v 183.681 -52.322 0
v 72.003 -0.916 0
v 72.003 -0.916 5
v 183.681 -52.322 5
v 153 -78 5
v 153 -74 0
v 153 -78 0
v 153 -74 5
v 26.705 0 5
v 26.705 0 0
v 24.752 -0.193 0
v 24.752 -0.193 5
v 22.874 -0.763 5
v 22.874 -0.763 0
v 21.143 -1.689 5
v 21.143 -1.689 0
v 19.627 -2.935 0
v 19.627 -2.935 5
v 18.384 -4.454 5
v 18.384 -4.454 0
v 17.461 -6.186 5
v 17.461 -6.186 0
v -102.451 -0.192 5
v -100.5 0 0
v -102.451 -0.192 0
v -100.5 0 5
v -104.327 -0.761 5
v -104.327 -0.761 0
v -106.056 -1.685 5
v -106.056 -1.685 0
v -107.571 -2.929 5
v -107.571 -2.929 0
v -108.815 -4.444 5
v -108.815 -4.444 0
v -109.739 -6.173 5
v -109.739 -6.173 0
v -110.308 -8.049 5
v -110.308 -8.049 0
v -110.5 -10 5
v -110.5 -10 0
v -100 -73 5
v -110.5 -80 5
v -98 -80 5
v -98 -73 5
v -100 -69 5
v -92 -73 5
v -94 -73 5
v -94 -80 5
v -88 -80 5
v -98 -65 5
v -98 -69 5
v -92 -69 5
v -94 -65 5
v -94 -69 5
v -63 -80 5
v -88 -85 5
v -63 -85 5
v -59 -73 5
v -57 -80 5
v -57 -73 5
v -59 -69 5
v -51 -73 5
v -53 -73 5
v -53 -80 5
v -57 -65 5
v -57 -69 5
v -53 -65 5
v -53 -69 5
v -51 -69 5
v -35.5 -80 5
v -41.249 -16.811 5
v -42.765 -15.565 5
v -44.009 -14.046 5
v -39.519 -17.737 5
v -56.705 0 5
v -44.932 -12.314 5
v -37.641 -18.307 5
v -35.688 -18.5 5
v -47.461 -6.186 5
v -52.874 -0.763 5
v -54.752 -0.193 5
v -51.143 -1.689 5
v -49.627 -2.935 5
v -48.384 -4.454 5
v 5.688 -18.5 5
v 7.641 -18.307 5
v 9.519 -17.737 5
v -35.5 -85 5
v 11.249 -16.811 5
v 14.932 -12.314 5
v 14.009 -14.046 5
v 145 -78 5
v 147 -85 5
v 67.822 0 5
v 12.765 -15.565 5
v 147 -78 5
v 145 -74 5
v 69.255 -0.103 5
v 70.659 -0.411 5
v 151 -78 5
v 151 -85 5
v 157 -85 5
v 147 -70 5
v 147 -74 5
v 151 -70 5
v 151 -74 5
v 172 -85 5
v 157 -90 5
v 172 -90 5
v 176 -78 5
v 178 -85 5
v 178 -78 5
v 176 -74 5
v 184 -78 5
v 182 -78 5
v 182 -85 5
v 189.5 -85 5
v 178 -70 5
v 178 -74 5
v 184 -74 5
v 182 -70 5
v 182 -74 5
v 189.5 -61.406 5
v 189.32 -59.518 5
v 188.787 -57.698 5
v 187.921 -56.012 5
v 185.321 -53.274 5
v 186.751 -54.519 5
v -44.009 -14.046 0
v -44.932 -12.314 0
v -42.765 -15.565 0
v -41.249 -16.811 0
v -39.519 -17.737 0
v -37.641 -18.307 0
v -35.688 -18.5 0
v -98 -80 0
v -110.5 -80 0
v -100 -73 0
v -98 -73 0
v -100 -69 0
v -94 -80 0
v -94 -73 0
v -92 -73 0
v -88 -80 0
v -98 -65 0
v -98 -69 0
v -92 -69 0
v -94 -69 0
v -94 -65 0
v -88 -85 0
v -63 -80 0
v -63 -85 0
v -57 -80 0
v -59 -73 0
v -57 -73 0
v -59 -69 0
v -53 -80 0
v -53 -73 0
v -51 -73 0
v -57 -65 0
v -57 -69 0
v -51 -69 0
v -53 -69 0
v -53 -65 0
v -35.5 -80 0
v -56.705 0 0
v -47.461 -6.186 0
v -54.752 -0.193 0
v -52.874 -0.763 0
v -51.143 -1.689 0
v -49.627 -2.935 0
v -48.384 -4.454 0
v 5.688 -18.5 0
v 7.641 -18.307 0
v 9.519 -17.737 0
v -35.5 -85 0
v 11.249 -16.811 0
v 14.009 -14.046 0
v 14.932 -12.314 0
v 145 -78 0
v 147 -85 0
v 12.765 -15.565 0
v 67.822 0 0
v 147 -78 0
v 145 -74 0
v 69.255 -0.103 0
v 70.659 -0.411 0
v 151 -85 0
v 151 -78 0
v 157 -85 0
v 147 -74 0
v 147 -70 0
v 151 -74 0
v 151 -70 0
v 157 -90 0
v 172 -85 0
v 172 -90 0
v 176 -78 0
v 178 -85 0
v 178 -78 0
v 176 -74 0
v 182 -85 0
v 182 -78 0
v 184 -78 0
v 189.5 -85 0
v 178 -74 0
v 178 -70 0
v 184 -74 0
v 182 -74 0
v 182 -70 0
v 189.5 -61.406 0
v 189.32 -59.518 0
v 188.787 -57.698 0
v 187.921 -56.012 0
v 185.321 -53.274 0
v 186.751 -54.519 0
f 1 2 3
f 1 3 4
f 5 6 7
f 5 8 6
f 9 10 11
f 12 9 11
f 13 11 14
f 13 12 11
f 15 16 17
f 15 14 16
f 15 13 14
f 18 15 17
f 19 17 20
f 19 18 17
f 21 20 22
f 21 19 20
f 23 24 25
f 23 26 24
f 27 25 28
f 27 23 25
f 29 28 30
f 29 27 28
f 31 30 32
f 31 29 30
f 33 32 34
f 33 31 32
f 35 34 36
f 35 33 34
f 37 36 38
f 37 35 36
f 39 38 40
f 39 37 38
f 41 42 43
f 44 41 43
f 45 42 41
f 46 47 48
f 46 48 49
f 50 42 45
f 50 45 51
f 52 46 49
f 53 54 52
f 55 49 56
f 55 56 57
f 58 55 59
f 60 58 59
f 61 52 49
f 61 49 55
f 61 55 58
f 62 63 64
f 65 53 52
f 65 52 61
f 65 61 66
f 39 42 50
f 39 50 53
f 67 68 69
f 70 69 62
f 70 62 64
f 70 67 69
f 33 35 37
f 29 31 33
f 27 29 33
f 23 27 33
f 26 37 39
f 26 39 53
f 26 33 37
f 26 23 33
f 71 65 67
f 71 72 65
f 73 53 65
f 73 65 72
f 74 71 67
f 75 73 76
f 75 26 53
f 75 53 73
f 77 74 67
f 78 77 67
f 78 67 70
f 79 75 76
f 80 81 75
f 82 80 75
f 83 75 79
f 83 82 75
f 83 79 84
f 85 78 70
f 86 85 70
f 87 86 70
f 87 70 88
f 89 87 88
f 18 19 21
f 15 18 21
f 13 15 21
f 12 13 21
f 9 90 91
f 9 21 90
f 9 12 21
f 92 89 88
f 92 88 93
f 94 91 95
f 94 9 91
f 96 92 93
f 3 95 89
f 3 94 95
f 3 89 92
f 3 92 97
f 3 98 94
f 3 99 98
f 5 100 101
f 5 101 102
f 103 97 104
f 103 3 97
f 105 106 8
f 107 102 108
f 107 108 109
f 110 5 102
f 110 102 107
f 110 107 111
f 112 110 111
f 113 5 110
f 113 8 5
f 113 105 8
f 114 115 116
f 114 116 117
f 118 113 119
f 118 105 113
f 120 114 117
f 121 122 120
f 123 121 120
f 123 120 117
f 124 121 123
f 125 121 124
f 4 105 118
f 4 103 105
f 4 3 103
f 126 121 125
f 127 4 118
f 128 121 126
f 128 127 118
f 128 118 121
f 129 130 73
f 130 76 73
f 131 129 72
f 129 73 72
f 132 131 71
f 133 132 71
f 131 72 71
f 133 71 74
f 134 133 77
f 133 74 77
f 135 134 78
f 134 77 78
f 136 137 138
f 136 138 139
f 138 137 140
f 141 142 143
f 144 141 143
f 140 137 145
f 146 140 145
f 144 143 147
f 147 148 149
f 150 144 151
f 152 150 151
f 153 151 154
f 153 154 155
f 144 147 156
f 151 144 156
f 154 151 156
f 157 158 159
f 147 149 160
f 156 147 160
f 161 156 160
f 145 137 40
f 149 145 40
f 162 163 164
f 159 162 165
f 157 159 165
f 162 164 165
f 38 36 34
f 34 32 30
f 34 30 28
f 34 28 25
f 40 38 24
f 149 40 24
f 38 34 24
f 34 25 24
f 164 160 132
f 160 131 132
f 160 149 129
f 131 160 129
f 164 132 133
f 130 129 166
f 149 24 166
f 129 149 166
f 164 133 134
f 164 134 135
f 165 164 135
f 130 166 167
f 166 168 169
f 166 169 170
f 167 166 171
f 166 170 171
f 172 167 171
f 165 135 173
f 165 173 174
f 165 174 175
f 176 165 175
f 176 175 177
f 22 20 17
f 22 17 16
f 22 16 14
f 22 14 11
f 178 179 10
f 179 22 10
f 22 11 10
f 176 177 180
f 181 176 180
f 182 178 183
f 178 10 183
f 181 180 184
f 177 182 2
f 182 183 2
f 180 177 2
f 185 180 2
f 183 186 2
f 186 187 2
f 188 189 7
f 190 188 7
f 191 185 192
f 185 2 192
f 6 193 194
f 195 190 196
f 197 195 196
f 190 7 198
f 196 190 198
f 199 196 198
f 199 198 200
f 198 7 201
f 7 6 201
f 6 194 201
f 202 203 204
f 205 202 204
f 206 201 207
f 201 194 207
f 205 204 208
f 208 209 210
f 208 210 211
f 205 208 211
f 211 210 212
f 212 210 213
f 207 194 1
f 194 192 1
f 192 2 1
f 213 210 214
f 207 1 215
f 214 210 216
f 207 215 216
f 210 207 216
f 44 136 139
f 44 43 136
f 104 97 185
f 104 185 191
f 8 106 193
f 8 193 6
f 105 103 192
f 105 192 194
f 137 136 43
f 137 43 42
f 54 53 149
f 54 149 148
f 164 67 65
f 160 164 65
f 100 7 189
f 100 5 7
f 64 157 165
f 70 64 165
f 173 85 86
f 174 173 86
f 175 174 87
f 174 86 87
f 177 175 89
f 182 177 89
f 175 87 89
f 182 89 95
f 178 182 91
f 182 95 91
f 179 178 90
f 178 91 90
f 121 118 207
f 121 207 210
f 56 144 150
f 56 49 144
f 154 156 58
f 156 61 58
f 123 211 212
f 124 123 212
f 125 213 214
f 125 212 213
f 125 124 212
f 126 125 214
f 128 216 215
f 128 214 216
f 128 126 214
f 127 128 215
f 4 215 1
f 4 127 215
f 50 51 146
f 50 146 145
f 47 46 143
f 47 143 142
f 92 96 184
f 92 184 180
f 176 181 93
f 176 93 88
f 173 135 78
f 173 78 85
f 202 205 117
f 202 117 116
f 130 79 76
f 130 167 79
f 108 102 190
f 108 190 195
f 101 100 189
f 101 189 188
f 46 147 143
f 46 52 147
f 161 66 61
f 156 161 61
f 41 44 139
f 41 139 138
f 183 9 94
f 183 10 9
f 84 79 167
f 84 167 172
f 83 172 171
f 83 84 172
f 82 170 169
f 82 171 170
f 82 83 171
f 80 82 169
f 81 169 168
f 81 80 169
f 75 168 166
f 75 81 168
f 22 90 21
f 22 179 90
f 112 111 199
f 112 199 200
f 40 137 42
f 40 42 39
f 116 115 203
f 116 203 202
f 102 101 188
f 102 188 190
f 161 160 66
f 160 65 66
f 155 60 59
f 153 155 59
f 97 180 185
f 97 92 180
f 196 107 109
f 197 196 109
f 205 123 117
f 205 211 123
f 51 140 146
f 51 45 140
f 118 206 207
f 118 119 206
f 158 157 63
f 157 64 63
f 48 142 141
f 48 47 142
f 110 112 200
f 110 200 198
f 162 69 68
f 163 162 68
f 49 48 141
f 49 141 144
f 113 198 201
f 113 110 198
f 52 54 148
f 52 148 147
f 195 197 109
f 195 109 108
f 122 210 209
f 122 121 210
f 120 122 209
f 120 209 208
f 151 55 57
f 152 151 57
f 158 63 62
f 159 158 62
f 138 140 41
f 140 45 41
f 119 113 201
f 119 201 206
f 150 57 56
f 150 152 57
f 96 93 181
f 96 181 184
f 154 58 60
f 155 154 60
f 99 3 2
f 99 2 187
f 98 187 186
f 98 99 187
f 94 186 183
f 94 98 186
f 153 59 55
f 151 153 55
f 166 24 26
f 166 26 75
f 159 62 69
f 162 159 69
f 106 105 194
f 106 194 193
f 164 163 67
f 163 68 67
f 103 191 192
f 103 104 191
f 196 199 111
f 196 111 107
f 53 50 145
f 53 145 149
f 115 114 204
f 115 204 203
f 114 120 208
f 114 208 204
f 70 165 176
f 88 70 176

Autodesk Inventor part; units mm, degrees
ref_plane "YZ Plane" through (0, 0, 0) normal (1, 0, 0) x (0, 1, 0)
ref_plane "XZ Plane" through (0, 0, 0) normal (0, 1, 0) x (-1, 0, 0)
ref_plane "XY Plane" through (0, 0, 0) normal (0, 0, 1) x (1, 0, 0)
sketch "Sketch1" plane through (0, 0, 0) normal (0, 0, 1) x (1, 0, 0)
  circle A0 centre (0, 0) radius 63.5 construction
  line L0 (0, 0) -> (-110.5, 0) construction
  line L1 (-110.5, 0) -> (-110.5, -80) construction
  line L2 (-110.5, -80) -> (-35.5, -80) construction
  line L3 (0, 0) -> (189.5, 0) construction
  line L4 (189.5, 0) -> (189.5, -85) construction
  line L5 (189.5, -85) -> (134.5, -85) construction
  line L6 (-93, -80) -> (-53, -80) construction
  line L7 (-53, -80) -> (-53, -85) construction
  line L8 (-53, -85) -> (-93, -85) construction
  line L9 (-93, -85) -> (-93, -80) construction
  line L10 (147, -85) -> (177, -85) construction
  line L11 (177, -85) -> (177, -90) construction
  line L12 (177, -90) -> (147, -90) construction
  line L13 (147, -90) -> (147, -85) construction
  circle A1 centre (0, 0) radius 18.5 construction
  line L14 (-35.5, -80) -> (134.5, -85) construction
  line L15 (0, 0) -> (0, -63.5) construction
  line L16 (-20.0131, 0) -> (0, -48.5) construction
  line L17 (20.0131, 0) -> (0, -48.5) construction
  line L18 (-53, -80) -> (-53, -85)
  line L19 (-53, -85) -> (-93, -85)
  line L20 (-93, -85) -> (-93, -80)
  line L21 (-93, -80) -> (-110.5, -80)
  line L22 (-110.5, -80) -> (-110.5, 0)
  line L23 (-110.5, 0) -> (-20.0131, 0) construction
  line L24 (-20.0131, 0) -> (0, -48.5) construction
  line L25 (0, -48.5) -> (20.0131, 0) construction
  line L26 (20.0131, 0) -> (189.5, 0) construction
  line L27 (189.5, 0) -> (189.5, -85) construction
  line L28 (189.5, -85) -> (177, -85)
  line L29 (177, -85) -> (177, -90)
  line L30 (177, -90) -> (147, -90)
  line L31 (147, -90) -> (147, -85)
  line L32 (147, -85) -> (79.5, -85)
  line L33 (-53, -80) -> (-35.5, -80)
  line L34 (-35.5, -80) -> (-35.5, -85)
  line L35 (-35.5, -85) -> (79.5, -85)
  line L36 (20.0131, 0) -> (70.0131, 0)
  line L37 (70.0131, 0) -> (189.5, -55)
  line L38 (189.5, -55) -> (189.5, -85)
  line L39 (0, -48.5) -> (-30, -48.5) construction
  line L40 (-30, -48.5) -> (-50.0131, 0) construction
  line L41 (12.3793, -18.5) -> (-42.3793, -18.5) construction
  line L42 (-110.5, 0) -> (-50.0131, 0)
  line L43 (-50.0131, 0) -> (-42.3793, -18.5)
  line L44 (-42.3793, -18.5) -> (12.3793, -18.5)
  line L45 (12.3793, -18.5) -> (20.0131, 0)
  dimension "d0" = 127
  dimension "d1" = 110.5
  dimension "d2" = 80
  dimension "d3" = 75
  dimension "d4" = 189.5
  dimension "d5" = 85
  dimension "d6" = 55
  dimension "d7" = 40
  dimension "d8" = 5
  dimension "d9" = 17.5
  dimension "d10" = 30
  dimension "d11" = 5
  dimension "d12" = 42.5
  dimension "d13" = 37
  dimension "d14" = 15
  dimension "d18" = 50
  dimension "d19" = 30
  dimension "d59" = 30
extrude "Extrusion1" add sketch "Sketch1" along normal blind 5
fillet "Fillet1" radius 10 4 edges at (-110.5, 0, 2.5) (20.0131, 0, 2.5) (70.0131, 0, 2.5) (189.5, -55, 2.5)
sketch "Sketch2" plane through (0, 0, 5) normal (0, 0, 1) x (1, 0, 0)
  circle A0 centre (0, 0) radius 63.5 construction
  line L0 (0, 0) -> (-110.5, 0) construction
  line L1 (-110.5, 0) -> (-110.5, -80) construction
  line L2 (0, 0) -> (189.5, 0) construction
  line L3 (189.5, 0) -> (189.5, -85) construction
  line L4 (-88, -80) -> (-63, -80) construction
  line L5 (-63, -80) -> (-63, -85) construction
  line L6 (-63, -85) -> (-88, -85) construction
  line L7 (-88, -85) -> (-88, -80) construction
  line L8 (157, -85) -> (172, -85) construction
  line L9 (172, -85) -> (172, -90) construction
  line L10 (172, -90) -> (157, -90) construction
  line L11 (157, -90) -> (157, -85) construction
  circle A1 centre (0, 0) radius 33.5 construction
  line L12 (-35.5, -80) -> (134.5, -85) construction
  line L13 (0, 0) -> (0, -63.5) construction
  line L14 (-40.8636, 0) -> (0, -58.5) construction
  line L15 (40.8636, 0) -> (0, -58.5) construction
  line L16 (-63, -80) -> (-63, -85) construction
  line L17 (-63, -85) -> (-88, -85) construction
  line L18 (-88, -85) -> (-88, -80) construction
  line L19 (-110.5, -80) -> (-110.5, 0) construction
  line L20 (-110.5, 0) -> (-40.8636, 0) construction
  line L21 (-40.8636, 0) -> (0, -58.5) construction
  line L22 (0, -58.5) -> (40.8636, 0) construction
  line L23 (40.8636, 0) -> (189.5, 0) construction
  line L24 (189.5, 0) -> (189.5, -85) construction
  line L25 (172, -85) -> (172, -90) construction
  line L26 (172, -90) -> (157, -90) construction
  line L27 (157, -90) -> (157, -85) construction
  line L28 (-35.5, -80) -> (-35.5, -85) construction
  line L29 (-35.5, -85) -> (94.5, -85) construction
  line L30 (40.8636, 0) -> (70.8636, 0) construction
  line L31 (70.8636, 0) -> (189.5, -55) construction
  line L32 (189.5, -55) -> (189.5, -85) construction
  line L33 (151, -85) -> (145, -85) construction
  line L34 (172, -85) -> (178, -85) construction
  line L35 (151, -85) -> (149, -85) construction
  line L36 (147, -85) -> (147, -70) construction
  line L37 (147, -70) -> (151, -70) construction
  line L38 (151, -70) -> (151, -85) construction
  line L39 (149, -70) -> (149, -85) construction
  line L40 (145, -78) -> (153, -78) construction
  line L41 (153, -78) -> (153, -74) construction
  line L42 (153, -74) -> (145, -74) construction
  line L43 (145, -74) -> (145, -78) construction
  line L44 (145, -78) -> (153, -74) construction
  line L45 (153, -78) -> (145, -74) construction
  line L46 (180, -85) -> (182, -85) construction
  line L47 (182, -85) -> (182, -70) construction
  line L48 (182, -70) -> (178, -70) construction
  line L49 (178, -70) -> (178, -85) construction
  line L50 (180, -70) -> (180, -85) construction
  line L51 (184, -78) -> (176, -78) construction
  line L52 (176, -78) -> (176, -74) construction
  line L53 (176, -74) -> (184, -74) construction
  line L54 (184, -74) -> (184, -78) construction
  line L55 (184, -78) -> (176, -74) construction
  line L56 (176, -78) -> (184, -74) construction
  line L57 (147, -85) -> (147, -78) construction
  line L58 (147, -85) -> (147, -78) construction
  line L59 (147, -78) -> (145, -78) construction
  line L60 (145, -78) -> (145, -74) construction
  line L61 (145, -74) -> (147, -74) construction
  line L62 (147, -74) -> (147, -70) construction
  line L63 (147, -70) -> (151, -70) construction
  line L64 (151, -70) -> (151, -74) construction
  line L65 (151, -74) -> (153, -74) construction
  line L66 (153, -74) -> (153, -78) construction
  line L67 (153, -78) -> (151, -78) construction
  line L68 (151, -78) -> (151, -85) construction
  line L69 (147, -85) -> (134.5, -85) construction
  line L70 (157, -85) -> (151, -85) construction
  line L71 (147, -85) -> (94.5, -85) construction
  line L72 (178, -85) -> (178, -78) construction
  line L73 (178, -78) -> (176, -78) construction
  line L74 (176, -78) -> (176, -74) construction
  line L75 (176, -74) -> (178, -74) construction
  line L76 (178, -74) -> (178, -70) construction
  line L77 (178, -70) -> (182, -70) construction
  line L78 (182, -70) -> (182, -74) construction
  line L79 (182, -74) -> (184, -74) construction
  line L80 (184, -74) -> (184, -78) construction
  line L81 (184, -78) -> (182, -78) construction
  line L82 (182, -78) -> (182, -85) construction
  line L83 (189.5, -85) -> (180, -85) construction
  line L84 (178, -85) -> (149, -85) construction
  line L85 (189.5, -85) -> (182, -85) construction
  line L86 (178, -85) -> (172, -85) construction
  line L87 (-98, -80) -> (-98, -65) construction
  line L88 (-98, -65) -> (-94, -65) construction
  line L89 (-94, -65) -> (-94, -80) construction
  line L90 (-55, -80) -> (-53, -80) construction
  line L91 (-53, -80) -> (-53, -65) construction
  line L92 (-53, -65) -> (-57, -65) construction
  line L93 (-57, -65) -> (-57, -80) construction
  line L94 (-96, -65) -> (-96, -80) construction
  line L95 (-55, -65) -> (-55, -80) construction
  line L96 (-100, -73) -> (-92, -73) construction
  line L97 (-92, -73) -> (-92, -69) construction
  line L98 (-92, -69) -> (-100, -69) construction
  line L99 (-100, -69) -> (-100, -73) construction
  line L100 (-100, -73) -> (-92, -69) construction
  line L101 (-92, -73) -> (-100, -69) construction
  line L102 (-51, -73) -> (-59, -73) construction
  line L103 (-59, -73) -> (-59, -69) construction
  line L104 (-59, -69) -> (-51, -69) construction
  line L105 (-51, -69) -> (-51, -73) construction
  line L106 (-51, -73) -> (-59, -69) construction
  line L107 (-59, -73) -> (-51, -69) construction
  line L108 (-98, -80) -> (-98, -73) construction
  line L109 (-98, -73) -> (-100, -73) construction
  line L110 (-100, -73) -> (-100, -69) construction
  line L111 (-100, -69) -> (-98, -69) construction
  line L112 (-98, -69) -> (-98, -65) construction
  line L113 (-98, -65) -> (-94, -65) construction
  line L114 (-94, -65) -> (-94, -69) construction
  line L115 (-94, -69) -> (-92, -69) construction
  line L116 (-92, -69) -> (-92, -73) construction
  line L117 (-92, -73) -> (-94, -73) construction
  line L118 (-94, -73) -> (-94, -80) construction
  line L119 (-88, -80) -> (-94, -80) construction
  line L120 (-98, -80) -> (-110.5, -80) construction
  line L121 (-57, -80) -> (-57, -73) construction
  line L122 (-57, -73) -> (-59, -73) construction
  line L123 (-59, -73) -> (-59, -69) construction
  line L124 (-59, -69) -> (-57, -69) construction
  line L125 (-57, -69) -> (-57, -65) construction
  line L126 (-57, -65) -> (-53, -65) construction
  line L127 (-53, -65) -> (-53, -69) construction
  line L128 (-53, -69) -> (-51, -69) construction
  line L129 (-51, -69) -> (-51, -73) construction
  line L130 (-51, -73) -> (-53, -73) construction
  line L131 (-53, -73) -> (-53, -80) construction
  line L132 (-110.5, -80) -> (-57, -80) construction
  line L133 (-55, -80) -> (-35.5, -80) construction
  line L134 (-63, -80) -> (-57, -80) construction
  line L135 (-53, -80) -> (-35.5, -80) construction
  line L136 (-88, -85) -> (-94, -85)
  line L137 (-94, -85) -> (-94, -80)
  line L138 (-94, -80) -> (-88, -80)
  line L139 (-88, -80) -> (-88, -85)
  line L140 (-94, -80) -> (-98, -80)
  line L141 (-98, -80) -> (-98, -73)
  line L142 (-98, -73) -> (-100, -73)
  line L143 (-100, -69) -> (-100, -73)
  line L144 (-100, -69) -> (-98, -69)
  line L145 (-98, -69) -> (-98, -65)
  line L146 (-98, -65) -> (-94, -65)
  line L147 (-94, -65) -> (-94, -69)
  line L148 (-94, -69) -> (-92, -69)
  line L149 (-92, -69) -> (-92, -73)
  line L150 (-92, -73) -> (-94, -73)
  line L151 (-94, -73) -> (-94, -80)
  line L152 (-110.5, -80) -> (-93, -80) projected
  line L153 (-63, -80) -> (-63, -85)
  line L154 (-63, -85) -> (-53, -85)
  line L155 (-53, -85) -> (-53, -73)
  line L156 (-53, -73) -> (-51, -73)
  line L157 (-51, -73) -> (-51, -69)
  line L158 (-51, -69) -> (-53, -69)
  line L159 (-53, -69) -> (-53, -65)
  line L160 (-53, -65) -> (-57, -65)
  line L161 (-57, -65) -> (-57, -69)
  line L162 (-57, -69) -> (-59, -69)
  line L163 (-59, -69) -> (-59, -73)
  line L164 (-59, -73) -> (-57, -73)
  line L165 (-57, -73) -> (-57, -80)
  line L166 (-57, -80) -> (-63, -80)
  line L167 (157, -85) -> (157, -90)
  line L168 (157, -90) -> (147, -90)
  line L169 (147, -90) -> (147, -78)
  line L170 (147, -78) -> (145, -78)
  line L171 (145, -78) -> (145, -74)
  line L172 (145, -74) -> (147, -74)
  line L173 (147, -74) -> (147, -70)
  line L174 (147, -70) -> (151, -70)
  line L175 (151, -70) -> (151, -74)
  line L176 (151, -74) -> (153, -74)
  line L177 (153, -74) -> (153, -78)
  line L178 (153, -78) -> (151, -78)
  line L179 (151, -78) -> (151, -85)
  line L180 (151, -85) -> (157, -85)
  line L181 (147, -90) -> (177, -90) projected
  line L182 (172, -90) -> (177, -90)
  line L183 (177, -90) -> (177, -85)
  line L184 (177, -85) -> (172, -85)
  line L185 (172, -85) -> (172, -90)
  line L186 (178, -85) -> (178, -78)
  line L187 (178, -78) -> (176, -78)
  line L188 (176, -78) -> (176, -74)
  line L189 (176, -74) -> (178, -74)
  line L190 (178, -74) -> (178, -70)
  line L191 (178, -70) -> (182, -70)
  line L192 (182, -70) -> (182, -74)
  line L193 (182, -74) -> (184, -74)
  line L194 (184, -74) -> (184, -78)
  line L195 (184, -78) -> (182, -78)
  line L196 (182, -78) -> (182, -85)
  line L197 (182, -85) -> (178, -85)
  point P0 (149, -76)
  point P1 (180, -76)
  point P2 (-96, -71)
  point P3 (-55, -71)
  dimension "d20" = 127
  dimension "d21" = 110.5
  dimension "d22" = 80
  dimension "d23" = 75
  dimension "d24" = 189.5
  dimension "d25" = 85
  dimension "d26" = 55
  dimension "d27" = 25
  dimension "d28" = 5
  dimension "d29" = 27.5
  dimension "d30" = 15
  dimension "d31" = 5
  dimension "d32" = 67
  dimension "d33" = 5
  dimension "d34" = 30
  dimension "d35" = 30
  dimension "d36" = 17.5
  dimension "d37" = 6
  dimension "d38" = 4
  dimension "d39" = 15
  dimension "d40" = 8
  dimension "d41" = 4
  dimension "d42" = 4
  dimension "d43" = 8
  dimension "d44" = 6
  dimension "d45" = 4
  dimension "d46" = 15
  dimension "d47" = 6
  dimension "d48" = 4
  dimension "d49" = 15
  dimension "d50" = 6
  dimension "d51" = 8
  dimension "d52" = 4
  dimension "d53" = 8
  dimension "d54" = 7
  dimension "d55" = 7
  dimension "d56" = 12.5
extrude "Extrusion2" cut sketch "Sketch2" against normal blind 5
fillet "Fillet2" radius 10 3 edges at (-50.0131, 0, 2.5) (-42.3793, -18.5, 2.5) (12.3793, -18.5, 2.5)
properties part number "Soporte_Ambu_Der"
